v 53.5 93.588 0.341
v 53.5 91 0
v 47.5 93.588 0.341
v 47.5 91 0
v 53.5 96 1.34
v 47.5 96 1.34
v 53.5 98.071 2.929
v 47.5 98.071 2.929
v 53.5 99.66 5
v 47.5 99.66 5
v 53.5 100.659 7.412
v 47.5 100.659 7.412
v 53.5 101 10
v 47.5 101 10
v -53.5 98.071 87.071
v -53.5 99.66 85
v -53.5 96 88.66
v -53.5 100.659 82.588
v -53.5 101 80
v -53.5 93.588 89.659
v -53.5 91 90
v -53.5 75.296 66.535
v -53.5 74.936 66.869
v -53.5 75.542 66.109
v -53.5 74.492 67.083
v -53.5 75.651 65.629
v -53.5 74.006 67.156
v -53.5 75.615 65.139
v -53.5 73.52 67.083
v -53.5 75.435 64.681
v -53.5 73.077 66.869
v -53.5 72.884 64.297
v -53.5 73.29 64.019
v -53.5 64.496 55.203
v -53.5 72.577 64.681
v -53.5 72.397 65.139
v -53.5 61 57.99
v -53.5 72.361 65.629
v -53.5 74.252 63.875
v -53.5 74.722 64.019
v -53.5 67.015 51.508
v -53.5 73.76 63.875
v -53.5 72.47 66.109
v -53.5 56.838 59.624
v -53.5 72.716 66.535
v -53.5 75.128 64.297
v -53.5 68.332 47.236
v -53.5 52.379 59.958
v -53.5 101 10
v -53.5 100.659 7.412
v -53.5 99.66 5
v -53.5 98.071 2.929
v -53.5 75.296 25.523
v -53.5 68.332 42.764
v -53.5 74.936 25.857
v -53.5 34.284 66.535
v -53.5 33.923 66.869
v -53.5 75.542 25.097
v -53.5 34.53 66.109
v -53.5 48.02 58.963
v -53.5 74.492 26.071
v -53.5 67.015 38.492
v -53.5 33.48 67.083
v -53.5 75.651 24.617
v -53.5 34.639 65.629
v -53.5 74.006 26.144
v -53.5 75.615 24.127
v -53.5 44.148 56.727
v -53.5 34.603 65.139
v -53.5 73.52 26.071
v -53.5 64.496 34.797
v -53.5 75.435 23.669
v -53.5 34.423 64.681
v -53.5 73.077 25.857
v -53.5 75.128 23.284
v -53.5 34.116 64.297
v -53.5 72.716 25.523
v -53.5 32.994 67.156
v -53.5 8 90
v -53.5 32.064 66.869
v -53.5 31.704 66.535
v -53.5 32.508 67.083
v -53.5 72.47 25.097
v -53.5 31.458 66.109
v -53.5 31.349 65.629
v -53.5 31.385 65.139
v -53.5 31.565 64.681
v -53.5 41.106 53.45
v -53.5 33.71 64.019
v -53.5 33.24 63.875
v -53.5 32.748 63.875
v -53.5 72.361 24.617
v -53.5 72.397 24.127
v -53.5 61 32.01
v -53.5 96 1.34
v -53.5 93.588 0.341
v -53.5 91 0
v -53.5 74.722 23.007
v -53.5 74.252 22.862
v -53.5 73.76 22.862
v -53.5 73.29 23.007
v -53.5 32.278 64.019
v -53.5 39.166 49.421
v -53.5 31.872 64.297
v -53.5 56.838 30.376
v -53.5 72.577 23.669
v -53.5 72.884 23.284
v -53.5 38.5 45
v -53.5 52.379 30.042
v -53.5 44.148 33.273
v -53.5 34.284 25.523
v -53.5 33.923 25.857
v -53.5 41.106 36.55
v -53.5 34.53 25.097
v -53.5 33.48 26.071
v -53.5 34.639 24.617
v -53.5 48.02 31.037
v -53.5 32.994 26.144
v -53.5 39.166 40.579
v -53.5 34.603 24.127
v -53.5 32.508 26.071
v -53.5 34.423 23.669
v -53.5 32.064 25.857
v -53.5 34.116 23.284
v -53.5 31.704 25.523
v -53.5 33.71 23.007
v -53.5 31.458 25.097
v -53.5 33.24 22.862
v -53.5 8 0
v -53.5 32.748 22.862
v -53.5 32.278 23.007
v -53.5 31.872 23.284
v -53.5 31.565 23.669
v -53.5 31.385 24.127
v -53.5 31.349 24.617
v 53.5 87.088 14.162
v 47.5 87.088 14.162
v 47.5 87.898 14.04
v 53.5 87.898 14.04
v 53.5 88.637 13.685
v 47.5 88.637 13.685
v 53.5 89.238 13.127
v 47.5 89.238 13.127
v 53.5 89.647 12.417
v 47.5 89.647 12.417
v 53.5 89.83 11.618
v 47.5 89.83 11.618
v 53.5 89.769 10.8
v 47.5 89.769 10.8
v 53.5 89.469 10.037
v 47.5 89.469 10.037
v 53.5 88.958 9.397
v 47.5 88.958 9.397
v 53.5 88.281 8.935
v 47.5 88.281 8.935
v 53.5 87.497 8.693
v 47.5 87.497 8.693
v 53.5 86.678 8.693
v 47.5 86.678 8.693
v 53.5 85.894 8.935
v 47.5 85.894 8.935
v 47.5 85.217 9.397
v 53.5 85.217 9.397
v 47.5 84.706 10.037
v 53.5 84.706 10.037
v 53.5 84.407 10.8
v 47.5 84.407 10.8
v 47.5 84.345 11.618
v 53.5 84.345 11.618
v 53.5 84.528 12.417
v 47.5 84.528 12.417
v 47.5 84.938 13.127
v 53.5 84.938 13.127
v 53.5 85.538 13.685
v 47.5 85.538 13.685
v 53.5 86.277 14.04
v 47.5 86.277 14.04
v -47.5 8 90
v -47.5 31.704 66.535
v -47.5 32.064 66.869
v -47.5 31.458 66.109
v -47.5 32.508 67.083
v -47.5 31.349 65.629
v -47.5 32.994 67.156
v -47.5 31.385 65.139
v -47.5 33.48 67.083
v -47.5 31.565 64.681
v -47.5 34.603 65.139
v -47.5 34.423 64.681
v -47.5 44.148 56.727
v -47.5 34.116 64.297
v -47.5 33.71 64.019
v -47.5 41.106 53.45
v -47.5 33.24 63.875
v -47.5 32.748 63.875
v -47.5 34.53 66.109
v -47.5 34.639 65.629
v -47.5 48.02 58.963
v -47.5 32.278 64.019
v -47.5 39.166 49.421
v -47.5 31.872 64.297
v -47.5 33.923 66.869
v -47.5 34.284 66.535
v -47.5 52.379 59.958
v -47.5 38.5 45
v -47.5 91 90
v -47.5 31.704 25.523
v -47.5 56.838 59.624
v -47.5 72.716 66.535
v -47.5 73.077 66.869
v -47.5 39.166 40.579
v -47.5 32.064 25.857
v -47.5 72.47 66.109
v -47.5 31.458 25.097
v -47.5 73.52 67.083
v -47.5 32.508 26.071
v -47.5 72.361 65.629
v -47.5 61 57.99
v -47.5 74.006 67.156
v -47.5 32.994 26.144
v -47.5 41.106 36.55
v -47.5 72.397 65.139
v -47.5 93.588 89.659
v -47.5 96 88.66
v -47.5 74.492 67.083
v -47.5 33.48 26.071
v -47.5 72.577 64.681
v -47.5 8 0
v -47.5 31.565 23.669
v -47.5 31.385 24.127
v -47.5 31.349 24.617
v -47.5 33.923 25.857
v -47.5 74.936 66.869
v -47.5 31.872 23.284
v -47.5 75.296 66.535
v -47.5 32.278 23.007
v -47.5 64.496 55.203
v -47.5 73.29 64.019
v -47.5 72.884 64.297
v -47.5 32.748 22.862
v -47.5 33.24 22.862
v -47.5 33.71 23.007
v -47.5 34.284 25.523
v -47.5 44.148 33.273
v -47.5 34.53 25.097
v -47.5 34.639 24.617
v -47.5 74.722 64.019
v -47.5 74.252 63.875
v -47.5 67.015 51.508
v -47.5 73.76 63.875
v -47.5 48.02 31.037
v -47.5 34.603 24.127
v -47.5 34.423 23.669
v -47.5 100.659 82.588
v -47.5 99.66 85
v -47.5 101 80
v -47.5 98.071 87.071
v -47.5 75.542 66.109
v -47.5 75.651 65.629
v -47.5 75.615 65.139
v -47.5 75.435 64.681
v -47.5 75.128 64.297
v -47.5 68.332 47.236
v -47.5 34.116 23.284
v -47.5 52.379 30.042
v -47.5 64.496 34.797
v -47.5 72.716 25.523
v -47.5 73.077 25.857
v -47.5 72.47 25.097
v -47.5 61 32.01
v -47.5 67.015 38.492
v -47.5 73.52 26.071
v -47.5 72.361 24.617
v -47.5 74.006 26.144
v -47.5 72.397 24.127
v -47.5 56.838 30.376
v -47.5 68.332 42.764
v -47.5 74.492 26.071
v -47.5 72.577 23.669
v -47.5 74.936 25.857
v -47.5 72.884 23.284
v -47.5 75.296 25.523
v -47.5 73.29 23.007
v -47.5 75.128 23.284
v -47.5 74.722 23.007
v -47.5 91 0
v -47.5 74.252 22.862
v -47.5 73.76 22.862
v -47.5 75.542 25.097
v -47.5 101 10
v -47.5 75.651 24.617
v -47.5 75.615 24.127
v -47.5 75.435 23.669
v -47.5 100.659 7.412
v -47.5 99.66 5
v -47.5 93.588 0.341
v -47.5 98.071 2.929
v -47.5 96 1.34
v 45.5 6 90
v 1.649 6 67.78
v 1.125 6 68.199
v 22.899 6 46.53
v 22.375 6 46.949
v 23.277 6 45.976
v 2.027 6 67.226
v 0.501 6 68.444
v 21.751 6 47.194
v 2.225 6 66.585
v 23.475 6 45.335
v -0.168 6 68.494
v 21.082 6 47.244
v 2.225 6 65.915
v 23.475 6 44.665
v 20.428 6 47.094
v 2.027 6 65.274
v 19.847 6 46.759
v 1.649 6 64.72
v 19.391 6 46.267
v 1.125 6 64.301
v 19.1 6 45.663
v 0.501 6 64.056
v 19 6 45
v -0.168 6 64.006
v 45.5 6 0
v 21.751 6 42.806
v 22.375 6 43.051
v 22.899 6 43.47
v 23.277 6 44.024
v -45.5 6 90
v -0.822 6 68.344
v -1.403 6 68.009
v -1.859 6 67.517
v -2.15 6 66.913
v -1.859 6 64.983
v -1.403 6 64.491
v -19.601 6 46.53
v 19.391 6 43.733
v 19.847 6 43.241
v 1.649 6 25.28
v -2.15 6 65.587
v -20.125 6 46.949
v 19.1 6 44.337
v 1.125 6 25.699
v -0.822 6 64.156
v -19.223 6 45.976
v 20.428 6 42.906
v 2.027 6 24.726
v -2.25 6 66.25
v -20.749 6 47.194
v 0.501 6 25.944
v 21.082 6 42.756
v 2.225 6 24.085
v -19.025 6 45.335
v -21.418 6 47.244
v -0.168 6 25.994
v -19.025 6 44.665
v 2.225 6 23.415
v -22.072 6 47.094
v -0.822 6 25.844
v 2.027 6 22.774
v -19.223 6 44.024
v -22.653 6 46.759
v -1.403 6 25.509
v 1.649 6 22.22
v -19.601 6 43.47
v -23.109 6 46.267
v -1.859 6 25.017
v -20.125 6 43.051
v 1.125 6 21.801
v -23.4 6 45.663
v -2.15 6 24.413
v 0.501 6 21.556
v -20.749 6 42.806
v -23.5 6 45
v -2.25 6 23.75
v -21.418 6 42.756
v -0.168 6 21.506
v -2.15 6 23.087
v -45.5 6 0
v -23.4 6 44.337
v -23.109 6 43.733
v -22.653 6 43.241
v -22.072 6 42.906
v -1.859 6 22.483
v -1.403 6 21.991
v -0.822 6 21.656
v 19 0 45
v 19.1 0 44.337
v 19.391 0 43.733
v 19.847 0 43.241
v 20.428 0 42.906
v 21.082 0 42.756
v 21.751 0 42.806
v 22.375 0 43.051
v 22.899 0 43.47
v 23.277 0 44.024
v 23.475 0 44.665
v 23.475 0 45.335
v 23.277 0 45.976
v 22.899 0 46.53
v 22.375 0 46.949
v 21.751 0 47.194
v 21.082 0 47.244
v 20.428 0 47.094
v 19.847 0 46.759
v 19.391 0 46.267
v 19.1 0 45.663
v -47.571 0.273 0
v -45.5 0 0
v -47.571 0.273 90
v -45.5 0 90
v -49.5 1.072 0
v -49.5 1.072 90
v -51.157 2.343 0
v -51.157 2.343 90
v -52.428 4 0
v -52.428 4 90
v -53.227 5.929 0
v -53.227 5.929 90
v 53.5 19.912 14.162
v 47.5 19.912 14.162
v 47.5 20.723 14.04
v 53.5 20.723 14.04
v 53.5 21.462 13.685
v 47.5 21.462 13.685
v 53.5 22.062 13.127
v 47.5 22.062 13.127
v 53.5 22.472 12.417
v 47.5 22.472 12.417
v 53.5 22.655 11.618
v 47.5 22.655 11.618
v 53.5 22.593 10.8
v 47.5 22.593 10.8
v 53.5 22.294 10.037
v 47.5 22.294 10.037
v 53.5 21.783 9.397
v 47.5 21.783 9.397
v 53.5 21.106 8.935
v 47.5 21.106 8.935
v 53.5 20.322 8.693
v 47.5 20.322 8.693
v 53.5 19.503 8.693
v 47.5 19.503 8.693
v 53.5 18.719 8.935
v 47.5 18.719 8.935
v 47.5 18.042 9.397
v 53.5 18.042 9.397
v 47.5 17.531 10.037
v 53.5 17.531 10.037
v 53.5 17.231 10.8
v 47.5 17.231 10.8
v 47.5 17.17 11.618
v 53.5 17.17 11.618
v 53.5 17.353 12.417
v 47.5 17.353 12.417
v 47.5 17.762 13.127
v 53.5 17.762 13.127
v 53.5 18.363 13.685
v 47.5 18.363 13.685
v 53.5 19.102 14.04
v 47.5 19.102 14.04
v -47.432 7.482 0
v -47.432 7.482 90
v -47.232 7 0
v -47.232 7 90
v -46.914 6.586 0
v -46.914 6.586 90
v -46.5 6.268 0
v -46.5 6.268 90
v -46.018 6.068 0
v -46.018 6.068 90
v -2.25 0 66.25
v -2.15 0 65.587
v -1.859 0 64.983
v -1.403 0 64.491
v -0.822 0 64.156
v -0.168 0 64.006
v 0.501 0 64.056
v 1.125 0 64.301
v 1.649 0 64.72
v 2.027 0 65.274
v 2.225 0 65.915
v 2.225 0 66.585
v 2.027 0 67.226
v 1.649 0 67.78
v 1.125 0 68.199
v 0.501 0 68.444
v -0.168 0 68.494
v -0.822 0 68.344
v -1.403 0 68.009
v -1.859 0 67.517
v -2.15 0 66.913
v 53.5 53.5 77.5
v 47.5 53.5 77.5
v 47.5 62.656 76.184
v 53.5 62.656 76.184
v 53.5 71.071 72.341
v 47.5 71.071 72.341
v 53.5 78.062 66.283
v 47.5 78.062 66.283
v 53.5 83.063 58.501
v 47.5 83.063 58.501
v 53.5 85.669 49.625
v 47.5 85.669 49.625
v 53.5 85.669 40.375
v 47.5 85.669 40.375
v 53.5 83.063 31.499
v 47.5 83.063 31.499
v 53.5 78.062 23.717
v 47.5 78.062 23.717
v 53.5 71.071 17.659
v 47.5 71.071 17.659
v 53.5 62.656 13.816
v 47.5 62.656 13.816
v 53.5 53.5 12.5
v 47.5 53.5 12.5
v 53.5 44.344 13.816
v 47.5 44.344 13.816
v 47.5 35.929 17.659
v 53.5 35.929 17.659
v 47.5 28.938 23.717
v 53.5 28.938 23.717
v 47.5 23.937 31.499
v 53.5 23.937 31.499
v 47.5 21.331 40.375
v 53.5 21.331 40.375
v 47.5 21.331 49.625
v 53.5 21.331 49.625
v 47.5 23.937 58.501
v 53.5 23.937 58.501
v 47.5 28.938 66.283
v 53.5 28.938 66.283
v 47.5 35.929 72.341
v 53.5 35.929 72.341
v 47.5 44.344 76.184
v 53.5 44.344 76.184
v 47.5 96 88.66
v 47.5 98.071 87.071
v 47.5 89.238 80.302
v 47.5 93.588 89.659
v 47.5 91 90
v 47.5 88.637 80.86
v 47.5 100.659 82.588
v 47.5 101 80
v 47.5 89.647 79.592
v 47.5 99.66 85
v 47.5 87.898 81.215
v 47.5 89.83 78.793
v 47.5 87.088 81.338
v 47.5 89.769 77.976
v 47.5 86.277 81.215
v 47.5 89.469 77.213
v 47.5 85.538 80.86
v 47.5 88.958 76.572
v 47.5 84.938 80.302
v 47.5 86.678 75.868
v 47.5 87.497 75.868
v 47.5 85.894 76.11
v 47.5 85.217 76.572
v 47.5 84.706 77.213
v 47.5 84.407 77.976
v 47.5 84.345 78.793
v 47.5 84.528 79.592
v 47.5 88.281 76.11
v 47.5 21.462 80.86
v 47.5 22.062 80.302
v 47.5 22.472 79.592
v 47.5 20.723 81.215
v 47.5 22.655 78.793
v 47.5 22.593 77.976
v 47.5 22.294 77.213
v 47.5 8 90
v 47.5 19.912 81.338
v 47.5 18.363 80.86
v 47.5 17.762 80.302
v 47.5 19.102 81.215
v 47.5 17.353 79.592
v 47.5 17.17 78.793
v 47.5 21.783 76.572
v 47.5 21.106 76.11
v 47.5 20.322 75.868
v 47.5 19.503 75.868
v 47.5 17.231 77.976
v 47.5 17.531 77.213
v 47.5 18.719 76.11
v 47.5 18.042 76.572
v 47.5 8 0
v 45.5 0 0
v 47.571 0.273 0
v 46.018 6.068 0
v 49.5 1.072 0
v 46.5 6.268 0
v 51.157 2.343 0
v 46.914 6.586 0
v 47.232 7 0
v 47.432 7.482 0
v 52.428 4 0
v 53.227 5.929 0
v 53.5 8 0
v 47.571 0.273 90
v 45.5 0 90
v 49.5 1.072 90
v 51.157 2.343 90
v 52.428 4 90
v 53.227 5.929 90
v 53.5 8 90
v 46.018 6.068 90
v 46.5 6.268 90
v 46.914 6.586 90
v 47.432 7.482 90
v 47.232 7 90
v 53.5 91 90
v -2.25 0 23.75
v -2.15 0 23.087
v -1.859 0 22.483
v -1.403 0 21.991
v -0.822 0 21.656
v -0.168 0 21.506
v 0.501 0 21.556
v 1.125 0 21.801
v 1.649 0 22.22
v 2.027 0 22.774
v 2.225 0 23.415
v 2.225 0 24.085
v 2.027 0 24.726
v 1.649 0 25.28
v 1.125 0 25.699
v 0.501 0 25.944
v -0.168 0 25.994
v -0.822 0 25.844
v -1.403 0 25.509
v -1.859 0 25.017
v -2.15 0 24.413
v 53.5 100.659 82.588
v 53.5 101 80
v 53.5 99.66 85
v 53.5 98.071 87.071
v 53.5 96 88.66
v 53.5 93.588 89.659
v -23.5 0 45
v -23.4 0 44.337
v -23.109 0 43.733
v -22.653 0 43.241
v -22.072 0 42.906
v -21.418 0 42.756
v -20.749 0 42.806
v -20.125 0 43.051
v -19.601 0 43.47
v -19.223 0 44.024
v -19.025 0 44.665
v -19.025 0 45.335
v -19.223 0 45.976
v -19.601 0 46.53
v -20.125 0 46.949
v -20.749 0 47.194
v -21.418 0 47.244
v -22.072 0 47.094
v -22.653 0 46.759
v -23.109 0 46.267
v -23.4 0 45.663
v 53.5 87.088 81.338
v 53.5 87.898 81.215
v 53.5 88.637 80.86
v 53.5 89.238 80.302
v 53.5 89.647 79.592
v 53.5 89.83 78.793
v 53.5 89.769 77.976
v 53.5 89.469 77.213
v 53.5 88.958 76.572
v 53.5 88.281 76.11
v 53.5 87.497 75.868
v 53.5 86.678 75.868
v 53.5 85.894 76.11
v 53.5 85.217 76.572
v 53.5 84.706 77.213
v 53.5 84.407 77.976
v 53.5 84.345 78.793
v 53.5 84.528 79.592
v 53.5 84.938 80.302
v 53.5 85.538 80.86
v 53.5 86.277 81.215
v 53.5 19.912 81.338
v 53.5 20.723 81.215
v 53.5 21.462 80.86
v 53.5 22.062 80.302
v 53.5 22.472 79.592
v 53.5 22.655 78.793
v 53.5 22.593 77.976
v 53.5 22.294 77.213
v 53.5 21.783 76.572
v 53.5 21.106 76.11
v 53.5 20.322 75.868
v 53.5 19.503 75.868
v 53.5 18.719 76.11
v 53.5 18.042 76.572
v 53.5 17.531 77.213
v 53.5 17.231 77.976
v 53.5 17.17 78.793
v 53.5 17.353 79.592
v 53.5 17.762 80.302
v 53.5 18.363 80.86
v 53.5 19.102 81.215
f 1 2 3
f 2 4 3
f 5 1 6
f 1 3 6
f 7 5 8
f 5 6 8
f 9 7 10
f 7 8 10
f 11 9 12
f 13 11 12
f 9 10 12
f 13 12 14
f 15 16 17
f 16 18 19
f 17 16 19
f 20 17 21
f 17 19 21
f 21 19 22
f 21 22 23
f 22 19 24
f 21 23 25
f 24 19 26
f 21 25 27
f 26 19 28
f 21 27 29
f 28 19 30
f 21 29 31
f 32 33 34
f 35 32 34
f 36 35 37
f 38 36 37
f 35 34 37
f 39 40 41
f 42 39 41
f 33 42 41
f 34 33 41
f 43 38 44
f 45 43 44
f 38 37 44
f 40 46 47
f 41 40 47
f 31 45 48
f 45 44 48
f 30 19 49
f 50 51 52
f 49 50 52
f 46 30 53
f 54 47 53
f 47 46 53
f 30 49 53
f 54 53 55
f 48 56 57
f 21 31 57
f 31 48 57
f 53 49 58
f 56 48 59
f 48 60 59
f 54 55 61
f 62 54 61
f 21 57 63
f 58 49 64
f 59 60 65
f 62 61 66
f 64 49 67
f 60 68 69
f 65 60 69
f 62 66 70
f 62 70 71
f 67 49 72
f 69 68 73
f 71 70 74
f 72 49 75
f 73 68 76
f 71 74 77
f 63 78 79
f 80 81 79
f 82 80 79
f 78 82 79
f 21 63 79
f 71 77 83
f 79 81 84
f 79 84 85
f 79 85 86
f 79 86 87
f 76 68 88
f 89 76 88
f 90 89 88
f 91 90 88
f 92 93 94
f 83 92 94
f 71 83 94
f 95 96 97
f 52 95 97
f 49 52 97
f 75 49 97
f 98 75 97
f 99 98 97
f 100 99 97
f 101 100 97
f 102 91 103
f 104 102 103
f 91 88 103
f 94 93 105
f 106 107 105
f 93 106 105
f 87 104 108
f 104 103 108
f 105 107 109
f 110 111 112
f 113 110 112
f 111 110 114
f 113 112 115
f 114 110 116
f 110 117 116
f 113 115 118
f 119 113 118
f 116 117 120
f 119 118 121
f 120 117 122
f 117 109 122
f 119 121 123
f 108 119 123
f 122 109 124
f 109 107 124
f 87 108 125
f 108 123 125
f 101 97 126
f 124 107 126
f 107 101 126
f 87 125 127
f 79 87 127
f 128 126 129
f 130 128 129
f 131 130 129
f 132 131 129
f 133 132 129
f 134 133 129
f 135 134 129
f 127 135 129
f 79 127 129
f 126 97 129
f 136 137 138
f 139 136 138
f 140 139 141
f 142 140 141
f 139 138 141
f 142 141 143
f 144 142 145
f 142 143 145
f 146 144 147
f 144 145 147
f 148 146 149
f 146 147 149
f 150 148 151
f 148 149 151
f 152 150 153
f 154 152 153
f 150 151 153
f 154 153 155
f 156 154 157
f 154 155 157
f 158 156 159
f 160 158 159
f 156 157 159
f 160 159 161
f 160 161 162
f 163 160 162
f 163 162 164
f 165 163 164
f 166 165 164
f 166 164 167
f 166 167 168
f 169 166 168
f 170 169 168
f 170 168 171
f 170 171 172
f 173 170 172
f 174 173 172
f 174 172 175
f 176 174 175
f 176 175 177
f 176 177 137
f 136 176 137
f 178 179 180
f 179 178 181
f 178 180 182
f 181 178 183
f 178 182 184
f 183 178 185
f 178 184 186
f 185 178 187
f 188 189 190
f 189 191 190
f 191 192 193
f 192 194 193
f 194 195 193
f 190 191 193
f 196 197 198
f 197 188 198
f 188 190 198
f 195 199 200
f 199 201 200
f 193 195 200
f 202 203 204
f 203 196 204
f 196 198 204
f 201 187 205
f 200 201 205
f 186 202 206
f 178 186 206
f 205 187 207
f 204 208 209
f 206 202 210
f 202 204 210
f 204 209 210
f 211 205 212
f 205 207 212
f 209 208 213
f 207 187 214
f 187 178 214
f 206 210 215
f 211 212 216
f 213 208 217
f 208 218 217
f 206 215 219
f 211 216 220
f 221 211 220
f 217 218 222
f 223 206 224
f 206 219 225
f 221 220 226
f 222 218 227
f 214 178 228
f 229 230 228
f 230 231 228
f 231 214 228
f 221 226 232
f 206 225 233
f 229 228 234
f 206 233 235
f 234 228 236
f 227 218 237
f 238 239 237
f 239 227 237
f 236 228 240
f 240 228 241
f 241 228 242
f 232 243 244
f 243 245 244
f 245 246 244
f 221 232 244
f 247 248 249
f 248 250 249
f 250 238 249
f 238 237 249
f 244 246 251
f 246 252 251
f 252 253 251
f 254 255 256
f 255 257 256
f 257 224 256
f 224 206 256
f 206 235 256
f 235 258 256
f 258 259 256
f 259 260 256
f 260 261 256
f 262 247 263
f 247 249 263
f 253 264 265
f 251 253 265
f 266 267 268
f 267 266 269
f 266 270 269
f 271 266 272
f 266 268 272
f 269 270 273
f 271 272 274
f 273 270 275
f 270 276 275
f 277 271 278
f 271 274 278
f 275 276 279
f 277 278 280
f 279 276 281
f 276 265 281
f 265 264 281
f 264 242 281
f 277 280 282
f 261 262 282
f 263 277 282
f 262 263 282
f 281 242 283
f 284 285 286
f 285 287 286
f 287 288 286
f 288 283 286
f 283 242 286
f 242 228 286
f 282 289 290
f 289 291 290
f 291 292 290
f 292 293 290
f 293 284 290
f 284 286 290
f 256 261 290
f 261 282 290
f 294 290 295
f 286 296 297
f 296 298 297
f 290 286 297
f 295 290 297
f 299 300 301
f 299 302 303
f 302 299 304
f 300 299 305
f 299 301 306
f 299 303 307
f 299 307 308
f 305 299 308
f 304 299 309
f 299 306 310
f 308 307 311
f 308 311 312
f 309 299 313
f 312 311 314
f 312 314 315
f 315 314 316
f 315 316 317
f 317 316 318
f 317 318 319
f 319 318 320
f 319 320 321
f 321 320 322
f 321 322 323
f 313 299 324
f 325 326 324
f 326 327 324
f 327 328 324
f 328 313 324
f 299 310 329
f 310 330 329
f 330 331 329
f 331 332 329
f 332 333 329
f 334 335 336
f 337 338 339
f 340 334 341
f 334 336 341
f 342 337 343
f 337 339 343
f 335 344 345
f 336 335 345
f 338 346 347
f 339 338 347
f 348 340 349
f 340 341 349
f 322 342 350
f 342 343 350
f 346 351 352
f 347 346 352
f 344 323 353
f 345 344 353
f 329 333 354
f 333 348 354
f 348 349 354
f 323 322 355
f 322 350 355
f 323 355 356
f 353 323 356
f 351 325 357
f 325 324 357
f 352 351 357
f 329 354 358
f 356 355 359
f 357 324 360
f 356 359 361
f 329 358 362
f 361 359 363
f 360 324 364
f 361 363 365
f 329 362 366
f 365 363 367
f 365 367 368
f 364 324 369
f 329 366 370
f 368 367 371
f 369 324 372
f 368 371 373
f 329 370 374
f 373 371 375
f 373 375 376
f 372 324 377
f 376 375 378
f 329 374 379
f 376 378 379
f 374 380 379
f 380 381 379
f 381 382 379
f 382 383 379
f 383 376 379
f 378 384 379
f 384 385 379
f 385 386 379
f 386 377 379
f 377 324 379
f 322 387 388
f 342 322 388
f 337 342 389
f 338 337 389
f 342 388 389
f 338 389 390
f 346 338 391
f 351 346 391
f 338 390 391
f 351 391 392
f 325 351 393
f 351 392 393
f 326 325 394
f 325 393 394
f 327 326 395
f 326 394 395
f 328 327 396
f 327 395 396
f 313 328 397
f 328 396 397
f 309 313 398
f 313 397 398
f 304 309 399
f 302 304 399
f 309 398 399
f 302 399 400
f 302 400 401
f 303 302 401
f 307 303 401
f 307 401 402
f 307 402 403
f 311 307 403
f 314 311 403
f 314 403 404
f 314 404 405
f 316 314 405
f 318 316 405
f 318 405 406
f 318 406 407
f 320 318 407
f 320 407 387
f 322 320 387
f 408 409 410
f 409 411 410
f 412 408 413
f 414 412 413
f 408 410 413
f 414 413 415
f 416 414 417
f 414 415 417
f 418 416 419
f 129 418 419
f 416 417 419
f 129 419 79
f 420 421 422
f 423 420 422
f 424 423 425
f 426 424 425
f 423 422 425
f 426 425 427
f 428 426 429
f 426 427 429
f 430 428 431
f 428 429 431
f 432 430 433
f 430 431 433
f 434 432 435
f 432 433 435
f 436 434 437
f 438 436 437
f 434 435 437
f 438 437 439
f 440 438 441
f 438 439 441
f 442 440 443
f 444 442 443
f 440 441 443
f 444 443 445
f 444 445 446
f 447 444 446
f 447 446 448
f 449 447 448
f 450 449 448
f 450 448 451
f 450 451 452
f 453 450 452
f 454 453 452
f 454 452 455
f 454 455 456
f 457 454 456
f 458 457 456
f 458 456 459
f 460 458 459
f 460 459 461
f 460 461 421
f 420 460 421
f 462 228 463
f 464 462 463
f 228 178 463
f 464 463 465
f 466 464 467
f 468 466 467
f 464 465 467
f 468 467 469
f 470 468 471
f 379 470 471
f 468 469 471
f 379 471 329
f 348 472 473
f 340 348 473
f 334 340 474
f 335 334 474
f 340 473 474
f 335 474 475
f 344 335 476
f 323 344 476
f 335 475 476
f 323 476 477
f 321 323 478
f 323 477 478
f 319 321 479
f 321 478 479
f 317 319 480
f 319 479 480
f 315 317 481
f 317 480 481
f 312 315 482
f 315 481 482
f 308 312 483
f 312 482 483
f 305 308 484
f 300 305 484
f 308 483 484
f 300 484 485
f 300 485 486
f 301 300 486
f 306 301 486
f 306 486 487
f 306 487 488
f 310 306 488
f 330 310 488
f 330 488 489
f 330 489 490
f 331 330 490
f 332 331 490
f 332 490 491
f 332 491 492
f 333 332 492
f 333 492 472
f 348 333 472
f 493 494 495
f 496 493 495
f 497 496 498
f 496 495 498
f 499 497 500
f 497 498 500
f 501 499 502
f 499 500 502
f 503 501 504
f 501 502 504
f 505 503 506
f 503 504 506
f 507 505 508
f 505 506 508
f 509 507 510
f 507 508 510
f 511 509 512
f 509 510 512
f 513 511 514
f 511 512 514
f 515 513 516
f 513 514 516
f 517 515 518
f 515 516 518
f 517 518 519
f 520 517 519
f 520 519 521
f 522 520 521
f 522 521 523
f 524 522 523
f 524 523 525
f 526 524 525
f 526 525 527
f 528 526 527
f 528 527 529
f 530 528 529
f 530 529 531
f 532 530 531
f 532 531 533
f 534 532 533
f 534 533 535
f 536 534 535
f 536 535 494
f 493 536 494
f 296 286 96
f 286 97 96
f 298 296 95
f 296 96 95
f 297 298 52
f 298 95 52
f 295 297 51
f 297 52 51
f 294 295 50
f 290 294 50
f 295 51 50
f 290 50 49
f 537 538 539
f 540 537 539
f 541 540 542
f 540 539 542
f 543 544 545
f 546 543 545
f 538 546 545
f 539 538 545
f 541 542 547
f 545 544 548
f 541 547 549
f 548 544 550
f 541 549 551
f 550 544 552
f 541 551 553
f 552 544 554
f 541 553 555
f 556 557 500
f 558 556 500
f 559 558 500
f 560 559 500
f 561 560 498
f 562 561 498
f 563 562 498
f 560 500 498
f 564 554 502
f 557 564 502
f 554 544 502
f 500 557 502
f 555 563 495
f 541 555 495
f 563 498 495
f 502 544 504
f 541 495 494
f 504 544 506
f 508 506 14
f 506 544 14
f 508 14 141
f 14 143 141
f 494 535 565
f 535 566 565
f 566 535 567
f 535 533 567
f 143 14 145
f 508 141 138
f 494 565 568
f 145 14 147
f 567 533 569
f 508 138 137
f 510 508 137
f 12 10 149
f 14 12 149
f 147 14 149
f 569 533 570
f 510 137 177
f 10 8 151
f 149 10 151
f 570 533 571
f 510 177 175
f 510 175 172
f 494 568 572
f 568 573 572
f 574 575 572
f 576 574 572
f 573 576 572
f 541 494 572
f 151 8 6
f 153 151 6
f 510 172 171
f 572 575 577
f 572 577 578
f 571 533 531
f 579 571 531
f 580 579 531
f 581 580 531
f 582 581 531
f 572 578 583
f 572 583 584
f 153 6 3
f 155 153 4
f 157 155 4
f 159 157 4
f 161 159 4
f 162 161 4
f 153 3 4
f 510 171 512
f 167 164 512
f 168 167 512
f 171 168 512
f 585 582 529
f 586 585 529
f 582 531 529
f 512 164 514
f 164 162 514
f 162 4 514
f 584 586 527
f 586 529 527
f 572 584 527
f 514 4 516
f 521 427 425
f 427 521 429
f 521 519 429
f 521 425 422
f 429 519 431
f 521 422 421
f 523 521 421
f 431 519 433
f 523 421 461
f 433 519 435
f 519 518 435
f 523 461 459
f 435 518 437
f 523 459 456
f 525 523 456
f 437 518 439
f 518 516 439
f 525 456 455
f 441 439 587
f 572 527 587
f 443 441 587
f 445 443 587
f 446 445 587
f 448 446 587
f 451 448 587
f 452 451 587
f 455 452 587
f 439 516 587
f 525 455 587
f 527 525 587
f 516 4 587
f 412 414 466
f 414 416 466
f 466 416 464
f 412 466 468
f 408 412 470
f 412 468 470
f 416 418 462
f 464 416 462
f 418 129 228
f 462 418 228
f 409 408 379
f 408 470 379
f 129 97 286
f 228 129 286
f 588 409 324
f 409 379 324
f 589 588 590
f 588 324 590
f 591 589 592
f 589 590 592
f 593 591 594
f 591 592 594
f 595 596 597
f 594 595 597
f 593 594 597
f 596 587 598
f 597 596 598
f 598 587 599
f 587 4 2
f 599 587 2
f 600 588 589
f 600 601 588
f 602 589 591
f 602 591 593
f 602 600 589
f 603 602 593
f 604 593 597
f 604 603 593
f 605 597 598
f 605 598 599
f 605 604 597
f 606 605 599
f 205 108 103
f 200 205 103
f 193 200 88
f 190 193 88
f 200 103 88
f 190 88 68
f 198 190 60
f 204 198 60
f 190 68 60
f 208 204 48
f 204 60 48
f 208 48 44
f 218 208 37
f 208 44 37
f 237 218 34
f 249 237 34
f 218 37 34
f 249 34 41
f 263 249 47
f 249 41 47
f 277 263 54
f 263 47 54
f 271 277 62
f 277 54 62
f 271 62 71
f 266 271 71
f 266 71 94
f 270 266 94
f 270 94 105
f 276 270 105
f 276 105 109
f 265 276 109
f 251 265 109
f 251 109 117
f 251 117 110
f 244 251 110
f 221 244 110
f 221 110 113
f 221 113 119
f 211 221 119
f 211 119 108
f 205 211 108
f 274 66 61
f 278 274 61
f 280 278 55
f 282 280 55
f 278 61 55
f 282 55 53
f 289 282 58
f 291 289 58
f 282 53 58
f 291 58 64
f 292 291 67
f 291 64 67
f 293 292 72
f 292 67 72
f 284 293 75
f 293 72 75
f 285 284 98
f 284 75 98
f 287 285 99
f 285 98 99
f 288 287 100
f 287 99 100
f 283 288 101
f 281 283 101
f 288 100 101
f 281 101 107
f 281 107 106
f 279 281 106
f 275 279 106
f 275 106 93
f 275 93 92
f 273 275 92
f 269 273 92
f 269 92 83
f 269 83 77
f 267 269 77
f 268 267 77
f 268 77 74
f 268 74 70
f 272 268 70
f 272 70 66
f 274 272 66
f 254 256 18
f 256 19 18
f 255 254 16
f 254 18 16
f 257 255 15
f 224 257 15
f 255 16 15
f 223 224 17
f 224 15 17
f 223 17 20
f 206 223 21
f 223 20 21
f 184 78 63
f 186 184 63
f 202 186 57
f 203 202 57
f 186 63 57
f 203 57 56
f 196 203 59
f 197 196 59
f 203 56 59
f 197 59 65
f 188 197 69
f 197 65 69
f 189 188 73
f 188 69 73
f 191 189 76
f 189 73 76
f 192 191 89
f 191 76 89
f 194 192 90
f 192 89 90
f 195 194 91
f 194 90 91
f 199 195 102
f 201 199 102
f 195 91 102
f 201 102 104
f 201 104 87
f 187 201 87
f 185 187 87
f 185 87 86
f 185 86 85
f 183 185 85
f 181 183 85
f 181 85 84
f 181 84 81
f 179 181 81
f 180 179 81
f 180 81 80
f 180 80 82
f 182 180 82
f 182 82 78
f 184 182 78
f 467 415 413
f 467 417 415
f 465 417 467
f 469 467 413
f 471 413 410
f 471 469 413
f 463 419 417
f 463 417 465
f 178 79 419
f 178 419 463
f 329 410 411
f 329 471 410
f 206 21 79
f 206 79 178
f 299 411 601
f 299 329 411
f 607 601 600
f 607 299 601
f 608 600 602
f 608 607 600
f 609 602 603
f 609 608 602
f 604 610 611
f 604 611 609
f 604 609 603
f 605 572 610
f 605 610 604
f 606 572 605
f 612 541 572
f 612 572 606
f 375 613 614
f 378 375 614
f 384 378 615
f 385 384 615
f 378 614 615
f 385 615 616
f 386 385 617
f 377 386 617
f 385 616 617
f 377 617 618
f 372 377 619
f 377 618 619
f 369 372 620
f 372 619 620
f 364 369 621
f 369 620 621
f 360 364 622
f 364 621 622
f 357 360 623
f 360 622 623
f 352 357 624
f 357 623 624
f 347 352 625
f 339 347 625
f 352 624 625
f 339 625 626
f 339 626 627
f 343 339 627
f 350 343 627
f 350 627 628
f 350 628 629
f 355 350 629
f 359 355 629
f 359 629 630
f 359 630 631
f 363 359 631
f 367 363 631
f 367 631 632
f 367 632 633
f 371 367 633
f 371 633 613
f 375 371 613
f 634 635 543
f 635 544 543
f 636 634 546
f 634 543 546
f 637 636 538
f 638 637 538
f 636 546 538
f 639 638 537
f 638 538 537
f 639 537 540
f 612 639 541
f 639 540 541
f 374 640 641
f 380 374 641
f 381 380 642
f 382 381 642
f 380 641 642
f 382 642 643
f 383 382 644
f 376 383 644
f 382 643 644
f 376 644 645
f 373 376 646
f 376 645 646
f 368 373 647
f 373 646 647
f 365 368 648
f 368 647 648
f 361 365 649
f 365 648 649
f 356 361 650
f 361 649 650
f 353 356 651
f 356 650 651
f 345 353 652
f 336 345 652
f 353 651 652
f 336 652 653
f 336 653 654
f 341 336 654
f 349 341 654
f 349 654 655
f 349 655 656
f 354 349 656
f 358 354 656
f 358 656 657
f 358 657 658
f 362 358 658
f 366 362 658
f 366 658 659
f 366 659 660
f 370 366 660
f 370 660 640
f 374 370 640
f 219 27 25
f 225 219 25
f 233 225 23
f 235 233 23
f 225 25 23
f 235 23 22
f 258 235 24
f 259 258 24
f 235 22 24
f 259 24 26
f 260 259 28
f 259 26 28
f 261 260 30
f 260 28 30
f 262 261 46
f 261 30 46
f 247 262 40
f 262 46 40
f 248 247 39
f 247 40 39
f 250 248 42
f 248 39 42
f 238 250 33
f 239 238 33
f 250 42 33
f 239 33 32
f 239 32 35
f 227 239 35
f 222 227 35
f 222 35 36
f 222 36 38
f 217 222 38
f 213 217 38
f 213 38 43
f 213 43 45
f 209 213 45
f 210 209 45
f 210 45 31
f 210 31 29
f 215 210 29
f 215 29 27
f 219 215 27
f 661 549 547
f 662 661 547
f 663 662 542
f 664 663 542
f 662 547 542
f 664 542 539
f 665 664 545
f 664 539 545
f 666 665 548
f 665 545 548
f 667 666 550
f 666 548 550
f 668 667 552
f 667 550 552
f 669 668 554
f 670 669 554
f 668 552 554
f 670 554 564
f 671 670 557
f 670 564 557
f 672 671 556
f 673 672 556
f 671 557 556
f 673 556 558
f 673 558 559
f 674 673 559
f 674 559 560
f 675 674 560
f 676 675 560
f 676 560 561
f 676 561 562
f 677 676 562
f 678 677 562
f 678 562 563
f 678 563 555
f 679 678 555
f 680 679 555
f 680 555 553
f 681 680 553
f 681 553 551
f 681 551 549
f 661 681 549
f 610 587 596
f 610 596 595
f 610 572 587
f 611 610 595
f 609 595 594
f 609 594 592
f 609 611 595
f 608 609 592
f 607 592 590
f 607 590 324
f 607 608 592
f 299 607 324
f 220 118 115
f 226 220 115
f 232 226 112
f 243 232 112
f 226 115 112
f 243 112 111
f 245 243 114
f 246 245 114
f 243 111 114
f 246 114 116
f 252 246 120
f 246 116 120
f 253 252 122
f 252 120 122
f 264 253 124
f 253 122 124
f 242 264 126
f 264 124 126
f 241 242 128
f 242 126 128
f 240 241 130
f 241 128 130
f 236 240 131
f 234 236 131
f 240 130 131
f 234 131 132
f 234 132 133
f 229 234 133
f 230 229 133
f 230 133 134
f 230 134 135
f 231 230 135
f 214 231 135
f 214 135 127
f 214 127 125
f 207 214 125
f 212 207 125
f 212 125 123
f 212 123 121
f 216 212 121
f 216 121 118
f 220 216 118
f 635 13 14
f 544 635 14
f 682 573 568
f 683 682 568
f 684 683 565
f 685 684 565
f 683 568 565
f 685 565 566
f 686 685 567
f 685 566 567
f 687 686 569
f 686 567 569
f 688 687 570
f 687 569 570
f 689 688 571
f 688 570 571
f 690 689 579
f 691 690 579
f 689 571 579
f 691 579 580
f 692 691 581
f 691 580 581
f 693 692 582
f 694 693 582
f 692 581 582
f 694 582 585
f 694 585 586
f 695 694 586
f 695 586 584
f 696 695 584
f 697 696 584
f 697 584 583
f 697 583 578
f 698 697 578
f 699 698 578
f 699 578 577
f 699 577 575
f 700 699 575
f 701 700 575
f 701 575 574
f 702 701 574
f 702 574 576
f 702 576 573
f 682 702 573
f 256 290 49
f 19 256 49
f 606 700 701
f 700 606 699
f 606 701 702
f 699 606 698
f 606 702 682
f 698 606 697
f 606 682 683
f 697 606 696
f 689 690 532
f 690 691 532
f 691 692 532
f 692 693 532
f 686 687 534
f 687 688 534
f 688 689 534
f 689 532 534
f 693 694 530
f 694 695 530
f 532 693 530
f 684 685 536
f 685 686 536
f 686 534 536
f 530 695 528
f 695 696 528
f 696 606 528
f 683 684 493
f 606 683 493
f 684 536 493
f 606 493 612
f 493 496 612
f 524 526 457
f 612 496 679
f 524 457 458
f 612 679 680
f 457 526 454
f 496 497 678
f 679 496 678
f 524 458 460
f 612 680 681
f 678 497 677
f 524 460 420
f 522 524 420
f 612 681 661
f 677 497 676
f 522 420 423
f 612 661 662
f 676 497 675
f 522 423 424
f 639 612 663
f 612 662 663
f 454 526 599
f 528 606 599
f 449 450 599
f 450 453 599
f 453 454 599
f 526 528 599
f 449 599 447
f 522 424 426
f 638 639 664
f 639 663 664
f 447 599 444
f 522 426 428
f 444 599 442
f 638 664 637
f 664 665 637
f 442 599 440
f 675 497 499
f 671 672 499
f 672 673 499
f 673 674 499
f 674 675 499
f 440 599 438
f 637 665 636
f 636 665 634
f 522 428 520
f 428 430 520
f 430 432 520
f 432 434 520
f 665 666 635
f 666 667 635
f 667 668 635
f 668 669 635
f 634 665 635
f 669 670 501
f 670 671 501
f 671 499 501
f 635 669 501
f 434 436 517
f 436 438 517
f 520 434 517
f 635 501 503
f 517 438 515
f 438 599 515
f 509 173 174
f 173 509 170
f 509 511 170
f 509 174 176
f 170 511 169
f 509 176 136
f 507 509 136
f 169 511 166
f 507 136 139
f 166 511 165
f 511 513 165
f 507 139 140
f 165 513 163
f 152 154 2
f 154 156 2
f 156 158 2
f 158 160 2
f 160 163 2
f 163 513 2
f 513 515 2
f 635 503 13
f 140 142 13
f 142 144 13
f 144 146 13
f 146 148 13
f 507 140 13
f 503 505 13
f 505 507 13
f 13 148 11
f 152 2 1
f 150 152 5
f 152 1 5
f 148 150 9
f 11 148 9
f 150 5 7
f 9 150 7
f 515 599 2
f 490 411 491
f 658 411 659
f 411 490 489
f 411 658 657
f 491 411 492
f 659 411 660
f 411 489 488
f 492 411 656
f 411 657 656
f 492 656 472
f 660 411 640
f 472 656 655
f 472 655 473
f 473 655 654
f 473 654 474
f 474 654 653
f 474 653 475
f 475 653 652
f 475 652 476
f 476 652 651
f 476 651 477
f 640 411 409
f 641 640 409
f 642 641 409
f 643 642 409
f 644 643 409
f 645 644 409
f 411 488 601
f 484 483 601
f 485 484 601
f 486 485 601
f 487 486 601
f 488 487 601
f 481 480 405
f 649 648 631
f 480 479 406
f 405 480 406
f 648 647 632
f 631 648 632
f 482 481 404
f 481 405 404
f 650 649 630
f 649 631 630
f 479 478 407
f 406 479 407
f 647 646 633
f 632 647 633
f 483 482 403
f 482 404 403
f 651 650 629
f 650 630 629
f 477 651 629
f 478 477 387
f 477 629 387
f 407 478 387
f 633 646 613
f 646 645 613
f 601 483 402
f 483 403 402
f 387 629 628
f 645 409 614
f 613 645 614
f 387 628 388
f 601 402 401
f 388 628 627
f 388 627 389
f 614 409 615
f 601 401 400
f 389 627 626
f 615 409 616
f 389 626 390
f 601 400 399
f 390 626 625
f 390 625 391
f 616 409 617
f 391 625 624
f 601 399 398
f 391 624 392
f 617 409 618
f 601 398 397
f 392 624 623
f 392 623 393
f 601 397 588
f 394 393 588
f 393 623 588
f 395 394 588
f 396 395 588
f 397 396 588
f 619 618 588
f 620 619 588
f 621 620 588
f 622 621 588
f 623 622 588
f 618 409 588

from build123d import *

# Parameters (mm, degrees)
BOSS_EXTRUDE1_DEPTH      = 90
M4_CLEARANCE_HOLE1_D     = 4.5
SKETCH4_R                = 32.5
CUT_EXTRUDE1_DEPTH       = 169.825353546
M5_CLEARANCE_HOLE1_D     = 5.5
M5_CLEARANCE_HOLE1_DEPTH = 6
CUT_EXTRUDE2_REACH       = 174.482
SKETCH7_R                = 15
FILLET1_R                = 8
FILLET2_R                = 2
FILLET3_R                = 10
TAP_DRILL_FOR_M4_TAP1_D  = 3.3


with BuildPart() as part:
    # Sketch1 → Boss-Extrude1 (new body)
    with BuildSketch(Plane.XY):
        Polygon((-53.5, 0), (53.5, 0), (53.5, 101), (47.5, 101), (47.5, 6), (-47.5, 6), (-47.5, 101), (-53.5, 101), align=None)
    extrude(amount=BOSS_EXTRUDE1_DEPTH)

    # M4 Clearance Hole1 (through all)
    with Locations(Plane(origin=(0, 6, 0), x_dir=(1, 0, 0), z_dir=(0, 1, 0))):
        with Locations((-21.25, -45), (0, -23.75), (21.25, -45), (0, -66.25)):
            Hole(M4_CLEARANCE_HOLE1_D / 2)

    # Sketch4 → Cut-Extrude1 (cut, through all)
    with BuildSketch(Plane.ZY.offset(-47.5)):
        with Locations((45, 53.5)):
            Circle(SKETCH4_R)
    extrude(amount=-CUT_EXTRUDE1_DEPTH, mode=Mode.SUBTRACT)

    # M5 Clearance Hole1
    with Locations(Plane(origin=(53.5, 0, 0), x_dir=(0, 0, -1), z_dir=(1, 0, 0))):
        with Locations((-78.587572106, 87.087572106), (-11.412427894, 87.087572106), (-11.412427894, 19.912427894), (-78.587572106, 19.912427894)):
            Hole(M5_CLEARANCE_HOLE1_D / 2, depth=M5_CLEARANCE_HOLE1_DEPTH)

    # Sketch7 → Cut-Extrude2 (cut, up to next)
    with BuildSketch(Plane.ZY.offset(53.5), mode=Mode.PRIVATE) as cut_extrude2_sk1:
        with Locations(Location((45, 53.5, 0), (0, 0, 270))):
            Circle(SKETCH7_R)
    cut_extrude2_tool1 = extrude(cut_extrude2_sk1.sketch, amount=-CUT_EXTRUDE2_REACH, mode=Mode.PRIVATE) & part.part
    add(cut_extrude2_tool1.solids().sort_by_distance((-53.5, 53.5, 45))[0], mode=Mode.SUBTRACT)

    # Fillet1
    fillet1_edges = [part.edges().sort_by_distance(p)[0] for p in [
        (53.5, 0, 45),
        (-53.5, 0, 45),
    ]]
    fillet(fillet1_edges, radius=FILLET1_R)

    # Fillet2
    fillet2_edges = [part.edges().sort_by_distance(p)[0] for p in [
        (-47.5, 6, 45),
        (47.5, 6, 45),
    ]]
    fillet(fillet2_edges, radius=FILLET2_R)

    # Fillet3
    fillet3_edges = [part.edges().sort_by_distance(p)[0] for p in [
        (-50.5, 101, 0),
        (-50.5, 101, 90),
        (50.5, 101, 90),
        (50.5, 101, 0),
    ]]
    fillet(fillet3_edges, radius=FILLET3_R)

    # Tap Drill for M4 Tap1 (through all)
    with Locations(Plane(origin=(-47.5, 0, 0), x_dir=(0, 0, -1), z_dir=(1, 0, 0))):
        with Locations((-65.506096654, 74.006096654), (-24.493903346, 74.006096654), (-24.493903346, 32.993903346), (-65.506096654, 32.993903346)):
            Hole(TAP_DRILL_FOR_M4_TAP1_D / 2)


solid = part.part
